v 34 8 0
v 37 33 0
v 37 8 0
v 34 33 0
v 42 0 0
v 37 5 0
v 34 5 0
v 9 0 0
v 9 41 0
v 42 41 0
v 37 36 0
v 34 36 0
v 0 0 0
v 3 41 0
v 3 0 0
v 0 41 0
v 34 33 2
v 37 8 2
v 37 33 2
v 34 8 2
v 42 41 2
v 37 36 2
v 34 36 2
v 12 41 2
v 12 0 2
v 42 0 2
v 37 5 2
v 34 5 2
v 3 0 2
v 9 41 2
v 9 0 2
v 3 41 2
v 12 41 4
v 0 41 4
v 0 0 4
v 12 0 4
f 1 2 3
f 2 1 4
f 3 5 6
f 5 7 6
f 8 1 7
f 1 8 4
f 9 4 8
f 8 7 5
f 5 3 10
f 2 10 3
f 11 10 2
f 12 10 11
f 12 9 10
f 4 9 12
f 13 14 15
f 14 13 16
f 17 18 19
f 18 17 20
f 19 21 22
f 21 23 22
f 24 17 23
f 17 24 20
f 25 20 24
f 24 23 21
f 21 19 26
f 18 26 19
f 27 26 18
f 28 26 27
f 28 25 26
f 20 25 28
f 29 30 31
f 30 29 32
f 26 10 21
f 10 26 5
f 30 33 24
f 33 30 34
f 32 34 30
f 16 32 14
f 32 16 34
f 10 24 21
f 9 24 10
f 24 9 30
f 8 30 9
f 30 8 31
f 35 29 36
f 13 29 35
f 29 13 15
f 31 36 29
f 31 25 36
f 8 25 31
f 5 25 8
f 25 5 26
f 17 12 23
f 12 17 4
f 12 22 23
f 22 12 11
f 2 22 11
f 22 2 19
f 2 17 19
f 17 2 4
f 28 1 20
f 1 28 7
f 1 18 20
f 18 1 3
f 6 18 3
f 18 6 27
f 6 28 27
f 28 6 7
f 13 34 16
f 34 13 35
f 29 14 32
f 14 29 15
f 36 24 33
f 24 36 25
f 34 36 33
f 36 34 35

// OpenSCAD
// 38 = gear rack holder dist from axle
// 30 = plate dist from axle
// 8 = rack notch depth
// 10 = plate padding before screw holes
// 41 = plate

thickness=2;
length=41; // plate length
width=42; // plate width
slit_width = 6;
slit_length = length;
slit_start_x = 3;
slit_end_x = slit_start_x + slit_width;
slit_start_y = 0;
slit_end_y = slit_start_y + slit_length;
slit_cover_width = slit_width + slit_start_x + slit_width/2;
slit_offset = slit_start_x - slit_width/2;
notch_depth = 0;

base_points = [[0,0],[width,0],[width,length],[0,length]];
slit_points = [
    [slit_start_x,slit_start_y],
    [slit_end_x,slit_start_y],
    [slit_end_x,slit_end_y],
    [slit_start_x,slit_end_y]
];

hole_padding_x = 5;
hole_padding_y = 5;
hole_width = 3;
hole_x = width - hole_padding_x;
hole1_y = length - hole_padding_y;
hole2_y = hole_padding_y;
hole1 = [
    [hole_x-hole_width,hole1_y-hole_width],
    [hole_x,hole1_y-hole_width],
    [hole_x,hole1_y],
    [hole_x-hole_width,hole1_y]
];

hole2 = [
    [hole_x-hole_width,hole2_y+hole_width],
    [hole_x,hole2_y+hole_width],
    [hole_x,hole2_y],
    [hole_x-hole_width,hole2_y]
];

paths = [[0,1,2,3],[4,5,6,7]];
points = concat(
    base_points,
    slit_points,
    hole1,
    hole2
);

base_paths = concat(paths, [[8,9,10,11],[12,13,14,15]]);

linear_extrude(thickness) polygon(points=points, paths=base_paths, convexity=10);

notch_outer_points = [
    [slit_offset,0],
    [slit_cover_width,0],
    [slit_cover_width,length],
    [slit_offset,length]
];
notch_points = concat(
    notch_outer_points,
    slit_points
);
translate([0,0,thickness]) linear_extrude(notch_depth) polygon(notch_points, paths);
translate([0,0,thickness+notch_depth]) linear_extrude(thickness) polygon(notch_outer_points, [[0,1,2,3]]);
